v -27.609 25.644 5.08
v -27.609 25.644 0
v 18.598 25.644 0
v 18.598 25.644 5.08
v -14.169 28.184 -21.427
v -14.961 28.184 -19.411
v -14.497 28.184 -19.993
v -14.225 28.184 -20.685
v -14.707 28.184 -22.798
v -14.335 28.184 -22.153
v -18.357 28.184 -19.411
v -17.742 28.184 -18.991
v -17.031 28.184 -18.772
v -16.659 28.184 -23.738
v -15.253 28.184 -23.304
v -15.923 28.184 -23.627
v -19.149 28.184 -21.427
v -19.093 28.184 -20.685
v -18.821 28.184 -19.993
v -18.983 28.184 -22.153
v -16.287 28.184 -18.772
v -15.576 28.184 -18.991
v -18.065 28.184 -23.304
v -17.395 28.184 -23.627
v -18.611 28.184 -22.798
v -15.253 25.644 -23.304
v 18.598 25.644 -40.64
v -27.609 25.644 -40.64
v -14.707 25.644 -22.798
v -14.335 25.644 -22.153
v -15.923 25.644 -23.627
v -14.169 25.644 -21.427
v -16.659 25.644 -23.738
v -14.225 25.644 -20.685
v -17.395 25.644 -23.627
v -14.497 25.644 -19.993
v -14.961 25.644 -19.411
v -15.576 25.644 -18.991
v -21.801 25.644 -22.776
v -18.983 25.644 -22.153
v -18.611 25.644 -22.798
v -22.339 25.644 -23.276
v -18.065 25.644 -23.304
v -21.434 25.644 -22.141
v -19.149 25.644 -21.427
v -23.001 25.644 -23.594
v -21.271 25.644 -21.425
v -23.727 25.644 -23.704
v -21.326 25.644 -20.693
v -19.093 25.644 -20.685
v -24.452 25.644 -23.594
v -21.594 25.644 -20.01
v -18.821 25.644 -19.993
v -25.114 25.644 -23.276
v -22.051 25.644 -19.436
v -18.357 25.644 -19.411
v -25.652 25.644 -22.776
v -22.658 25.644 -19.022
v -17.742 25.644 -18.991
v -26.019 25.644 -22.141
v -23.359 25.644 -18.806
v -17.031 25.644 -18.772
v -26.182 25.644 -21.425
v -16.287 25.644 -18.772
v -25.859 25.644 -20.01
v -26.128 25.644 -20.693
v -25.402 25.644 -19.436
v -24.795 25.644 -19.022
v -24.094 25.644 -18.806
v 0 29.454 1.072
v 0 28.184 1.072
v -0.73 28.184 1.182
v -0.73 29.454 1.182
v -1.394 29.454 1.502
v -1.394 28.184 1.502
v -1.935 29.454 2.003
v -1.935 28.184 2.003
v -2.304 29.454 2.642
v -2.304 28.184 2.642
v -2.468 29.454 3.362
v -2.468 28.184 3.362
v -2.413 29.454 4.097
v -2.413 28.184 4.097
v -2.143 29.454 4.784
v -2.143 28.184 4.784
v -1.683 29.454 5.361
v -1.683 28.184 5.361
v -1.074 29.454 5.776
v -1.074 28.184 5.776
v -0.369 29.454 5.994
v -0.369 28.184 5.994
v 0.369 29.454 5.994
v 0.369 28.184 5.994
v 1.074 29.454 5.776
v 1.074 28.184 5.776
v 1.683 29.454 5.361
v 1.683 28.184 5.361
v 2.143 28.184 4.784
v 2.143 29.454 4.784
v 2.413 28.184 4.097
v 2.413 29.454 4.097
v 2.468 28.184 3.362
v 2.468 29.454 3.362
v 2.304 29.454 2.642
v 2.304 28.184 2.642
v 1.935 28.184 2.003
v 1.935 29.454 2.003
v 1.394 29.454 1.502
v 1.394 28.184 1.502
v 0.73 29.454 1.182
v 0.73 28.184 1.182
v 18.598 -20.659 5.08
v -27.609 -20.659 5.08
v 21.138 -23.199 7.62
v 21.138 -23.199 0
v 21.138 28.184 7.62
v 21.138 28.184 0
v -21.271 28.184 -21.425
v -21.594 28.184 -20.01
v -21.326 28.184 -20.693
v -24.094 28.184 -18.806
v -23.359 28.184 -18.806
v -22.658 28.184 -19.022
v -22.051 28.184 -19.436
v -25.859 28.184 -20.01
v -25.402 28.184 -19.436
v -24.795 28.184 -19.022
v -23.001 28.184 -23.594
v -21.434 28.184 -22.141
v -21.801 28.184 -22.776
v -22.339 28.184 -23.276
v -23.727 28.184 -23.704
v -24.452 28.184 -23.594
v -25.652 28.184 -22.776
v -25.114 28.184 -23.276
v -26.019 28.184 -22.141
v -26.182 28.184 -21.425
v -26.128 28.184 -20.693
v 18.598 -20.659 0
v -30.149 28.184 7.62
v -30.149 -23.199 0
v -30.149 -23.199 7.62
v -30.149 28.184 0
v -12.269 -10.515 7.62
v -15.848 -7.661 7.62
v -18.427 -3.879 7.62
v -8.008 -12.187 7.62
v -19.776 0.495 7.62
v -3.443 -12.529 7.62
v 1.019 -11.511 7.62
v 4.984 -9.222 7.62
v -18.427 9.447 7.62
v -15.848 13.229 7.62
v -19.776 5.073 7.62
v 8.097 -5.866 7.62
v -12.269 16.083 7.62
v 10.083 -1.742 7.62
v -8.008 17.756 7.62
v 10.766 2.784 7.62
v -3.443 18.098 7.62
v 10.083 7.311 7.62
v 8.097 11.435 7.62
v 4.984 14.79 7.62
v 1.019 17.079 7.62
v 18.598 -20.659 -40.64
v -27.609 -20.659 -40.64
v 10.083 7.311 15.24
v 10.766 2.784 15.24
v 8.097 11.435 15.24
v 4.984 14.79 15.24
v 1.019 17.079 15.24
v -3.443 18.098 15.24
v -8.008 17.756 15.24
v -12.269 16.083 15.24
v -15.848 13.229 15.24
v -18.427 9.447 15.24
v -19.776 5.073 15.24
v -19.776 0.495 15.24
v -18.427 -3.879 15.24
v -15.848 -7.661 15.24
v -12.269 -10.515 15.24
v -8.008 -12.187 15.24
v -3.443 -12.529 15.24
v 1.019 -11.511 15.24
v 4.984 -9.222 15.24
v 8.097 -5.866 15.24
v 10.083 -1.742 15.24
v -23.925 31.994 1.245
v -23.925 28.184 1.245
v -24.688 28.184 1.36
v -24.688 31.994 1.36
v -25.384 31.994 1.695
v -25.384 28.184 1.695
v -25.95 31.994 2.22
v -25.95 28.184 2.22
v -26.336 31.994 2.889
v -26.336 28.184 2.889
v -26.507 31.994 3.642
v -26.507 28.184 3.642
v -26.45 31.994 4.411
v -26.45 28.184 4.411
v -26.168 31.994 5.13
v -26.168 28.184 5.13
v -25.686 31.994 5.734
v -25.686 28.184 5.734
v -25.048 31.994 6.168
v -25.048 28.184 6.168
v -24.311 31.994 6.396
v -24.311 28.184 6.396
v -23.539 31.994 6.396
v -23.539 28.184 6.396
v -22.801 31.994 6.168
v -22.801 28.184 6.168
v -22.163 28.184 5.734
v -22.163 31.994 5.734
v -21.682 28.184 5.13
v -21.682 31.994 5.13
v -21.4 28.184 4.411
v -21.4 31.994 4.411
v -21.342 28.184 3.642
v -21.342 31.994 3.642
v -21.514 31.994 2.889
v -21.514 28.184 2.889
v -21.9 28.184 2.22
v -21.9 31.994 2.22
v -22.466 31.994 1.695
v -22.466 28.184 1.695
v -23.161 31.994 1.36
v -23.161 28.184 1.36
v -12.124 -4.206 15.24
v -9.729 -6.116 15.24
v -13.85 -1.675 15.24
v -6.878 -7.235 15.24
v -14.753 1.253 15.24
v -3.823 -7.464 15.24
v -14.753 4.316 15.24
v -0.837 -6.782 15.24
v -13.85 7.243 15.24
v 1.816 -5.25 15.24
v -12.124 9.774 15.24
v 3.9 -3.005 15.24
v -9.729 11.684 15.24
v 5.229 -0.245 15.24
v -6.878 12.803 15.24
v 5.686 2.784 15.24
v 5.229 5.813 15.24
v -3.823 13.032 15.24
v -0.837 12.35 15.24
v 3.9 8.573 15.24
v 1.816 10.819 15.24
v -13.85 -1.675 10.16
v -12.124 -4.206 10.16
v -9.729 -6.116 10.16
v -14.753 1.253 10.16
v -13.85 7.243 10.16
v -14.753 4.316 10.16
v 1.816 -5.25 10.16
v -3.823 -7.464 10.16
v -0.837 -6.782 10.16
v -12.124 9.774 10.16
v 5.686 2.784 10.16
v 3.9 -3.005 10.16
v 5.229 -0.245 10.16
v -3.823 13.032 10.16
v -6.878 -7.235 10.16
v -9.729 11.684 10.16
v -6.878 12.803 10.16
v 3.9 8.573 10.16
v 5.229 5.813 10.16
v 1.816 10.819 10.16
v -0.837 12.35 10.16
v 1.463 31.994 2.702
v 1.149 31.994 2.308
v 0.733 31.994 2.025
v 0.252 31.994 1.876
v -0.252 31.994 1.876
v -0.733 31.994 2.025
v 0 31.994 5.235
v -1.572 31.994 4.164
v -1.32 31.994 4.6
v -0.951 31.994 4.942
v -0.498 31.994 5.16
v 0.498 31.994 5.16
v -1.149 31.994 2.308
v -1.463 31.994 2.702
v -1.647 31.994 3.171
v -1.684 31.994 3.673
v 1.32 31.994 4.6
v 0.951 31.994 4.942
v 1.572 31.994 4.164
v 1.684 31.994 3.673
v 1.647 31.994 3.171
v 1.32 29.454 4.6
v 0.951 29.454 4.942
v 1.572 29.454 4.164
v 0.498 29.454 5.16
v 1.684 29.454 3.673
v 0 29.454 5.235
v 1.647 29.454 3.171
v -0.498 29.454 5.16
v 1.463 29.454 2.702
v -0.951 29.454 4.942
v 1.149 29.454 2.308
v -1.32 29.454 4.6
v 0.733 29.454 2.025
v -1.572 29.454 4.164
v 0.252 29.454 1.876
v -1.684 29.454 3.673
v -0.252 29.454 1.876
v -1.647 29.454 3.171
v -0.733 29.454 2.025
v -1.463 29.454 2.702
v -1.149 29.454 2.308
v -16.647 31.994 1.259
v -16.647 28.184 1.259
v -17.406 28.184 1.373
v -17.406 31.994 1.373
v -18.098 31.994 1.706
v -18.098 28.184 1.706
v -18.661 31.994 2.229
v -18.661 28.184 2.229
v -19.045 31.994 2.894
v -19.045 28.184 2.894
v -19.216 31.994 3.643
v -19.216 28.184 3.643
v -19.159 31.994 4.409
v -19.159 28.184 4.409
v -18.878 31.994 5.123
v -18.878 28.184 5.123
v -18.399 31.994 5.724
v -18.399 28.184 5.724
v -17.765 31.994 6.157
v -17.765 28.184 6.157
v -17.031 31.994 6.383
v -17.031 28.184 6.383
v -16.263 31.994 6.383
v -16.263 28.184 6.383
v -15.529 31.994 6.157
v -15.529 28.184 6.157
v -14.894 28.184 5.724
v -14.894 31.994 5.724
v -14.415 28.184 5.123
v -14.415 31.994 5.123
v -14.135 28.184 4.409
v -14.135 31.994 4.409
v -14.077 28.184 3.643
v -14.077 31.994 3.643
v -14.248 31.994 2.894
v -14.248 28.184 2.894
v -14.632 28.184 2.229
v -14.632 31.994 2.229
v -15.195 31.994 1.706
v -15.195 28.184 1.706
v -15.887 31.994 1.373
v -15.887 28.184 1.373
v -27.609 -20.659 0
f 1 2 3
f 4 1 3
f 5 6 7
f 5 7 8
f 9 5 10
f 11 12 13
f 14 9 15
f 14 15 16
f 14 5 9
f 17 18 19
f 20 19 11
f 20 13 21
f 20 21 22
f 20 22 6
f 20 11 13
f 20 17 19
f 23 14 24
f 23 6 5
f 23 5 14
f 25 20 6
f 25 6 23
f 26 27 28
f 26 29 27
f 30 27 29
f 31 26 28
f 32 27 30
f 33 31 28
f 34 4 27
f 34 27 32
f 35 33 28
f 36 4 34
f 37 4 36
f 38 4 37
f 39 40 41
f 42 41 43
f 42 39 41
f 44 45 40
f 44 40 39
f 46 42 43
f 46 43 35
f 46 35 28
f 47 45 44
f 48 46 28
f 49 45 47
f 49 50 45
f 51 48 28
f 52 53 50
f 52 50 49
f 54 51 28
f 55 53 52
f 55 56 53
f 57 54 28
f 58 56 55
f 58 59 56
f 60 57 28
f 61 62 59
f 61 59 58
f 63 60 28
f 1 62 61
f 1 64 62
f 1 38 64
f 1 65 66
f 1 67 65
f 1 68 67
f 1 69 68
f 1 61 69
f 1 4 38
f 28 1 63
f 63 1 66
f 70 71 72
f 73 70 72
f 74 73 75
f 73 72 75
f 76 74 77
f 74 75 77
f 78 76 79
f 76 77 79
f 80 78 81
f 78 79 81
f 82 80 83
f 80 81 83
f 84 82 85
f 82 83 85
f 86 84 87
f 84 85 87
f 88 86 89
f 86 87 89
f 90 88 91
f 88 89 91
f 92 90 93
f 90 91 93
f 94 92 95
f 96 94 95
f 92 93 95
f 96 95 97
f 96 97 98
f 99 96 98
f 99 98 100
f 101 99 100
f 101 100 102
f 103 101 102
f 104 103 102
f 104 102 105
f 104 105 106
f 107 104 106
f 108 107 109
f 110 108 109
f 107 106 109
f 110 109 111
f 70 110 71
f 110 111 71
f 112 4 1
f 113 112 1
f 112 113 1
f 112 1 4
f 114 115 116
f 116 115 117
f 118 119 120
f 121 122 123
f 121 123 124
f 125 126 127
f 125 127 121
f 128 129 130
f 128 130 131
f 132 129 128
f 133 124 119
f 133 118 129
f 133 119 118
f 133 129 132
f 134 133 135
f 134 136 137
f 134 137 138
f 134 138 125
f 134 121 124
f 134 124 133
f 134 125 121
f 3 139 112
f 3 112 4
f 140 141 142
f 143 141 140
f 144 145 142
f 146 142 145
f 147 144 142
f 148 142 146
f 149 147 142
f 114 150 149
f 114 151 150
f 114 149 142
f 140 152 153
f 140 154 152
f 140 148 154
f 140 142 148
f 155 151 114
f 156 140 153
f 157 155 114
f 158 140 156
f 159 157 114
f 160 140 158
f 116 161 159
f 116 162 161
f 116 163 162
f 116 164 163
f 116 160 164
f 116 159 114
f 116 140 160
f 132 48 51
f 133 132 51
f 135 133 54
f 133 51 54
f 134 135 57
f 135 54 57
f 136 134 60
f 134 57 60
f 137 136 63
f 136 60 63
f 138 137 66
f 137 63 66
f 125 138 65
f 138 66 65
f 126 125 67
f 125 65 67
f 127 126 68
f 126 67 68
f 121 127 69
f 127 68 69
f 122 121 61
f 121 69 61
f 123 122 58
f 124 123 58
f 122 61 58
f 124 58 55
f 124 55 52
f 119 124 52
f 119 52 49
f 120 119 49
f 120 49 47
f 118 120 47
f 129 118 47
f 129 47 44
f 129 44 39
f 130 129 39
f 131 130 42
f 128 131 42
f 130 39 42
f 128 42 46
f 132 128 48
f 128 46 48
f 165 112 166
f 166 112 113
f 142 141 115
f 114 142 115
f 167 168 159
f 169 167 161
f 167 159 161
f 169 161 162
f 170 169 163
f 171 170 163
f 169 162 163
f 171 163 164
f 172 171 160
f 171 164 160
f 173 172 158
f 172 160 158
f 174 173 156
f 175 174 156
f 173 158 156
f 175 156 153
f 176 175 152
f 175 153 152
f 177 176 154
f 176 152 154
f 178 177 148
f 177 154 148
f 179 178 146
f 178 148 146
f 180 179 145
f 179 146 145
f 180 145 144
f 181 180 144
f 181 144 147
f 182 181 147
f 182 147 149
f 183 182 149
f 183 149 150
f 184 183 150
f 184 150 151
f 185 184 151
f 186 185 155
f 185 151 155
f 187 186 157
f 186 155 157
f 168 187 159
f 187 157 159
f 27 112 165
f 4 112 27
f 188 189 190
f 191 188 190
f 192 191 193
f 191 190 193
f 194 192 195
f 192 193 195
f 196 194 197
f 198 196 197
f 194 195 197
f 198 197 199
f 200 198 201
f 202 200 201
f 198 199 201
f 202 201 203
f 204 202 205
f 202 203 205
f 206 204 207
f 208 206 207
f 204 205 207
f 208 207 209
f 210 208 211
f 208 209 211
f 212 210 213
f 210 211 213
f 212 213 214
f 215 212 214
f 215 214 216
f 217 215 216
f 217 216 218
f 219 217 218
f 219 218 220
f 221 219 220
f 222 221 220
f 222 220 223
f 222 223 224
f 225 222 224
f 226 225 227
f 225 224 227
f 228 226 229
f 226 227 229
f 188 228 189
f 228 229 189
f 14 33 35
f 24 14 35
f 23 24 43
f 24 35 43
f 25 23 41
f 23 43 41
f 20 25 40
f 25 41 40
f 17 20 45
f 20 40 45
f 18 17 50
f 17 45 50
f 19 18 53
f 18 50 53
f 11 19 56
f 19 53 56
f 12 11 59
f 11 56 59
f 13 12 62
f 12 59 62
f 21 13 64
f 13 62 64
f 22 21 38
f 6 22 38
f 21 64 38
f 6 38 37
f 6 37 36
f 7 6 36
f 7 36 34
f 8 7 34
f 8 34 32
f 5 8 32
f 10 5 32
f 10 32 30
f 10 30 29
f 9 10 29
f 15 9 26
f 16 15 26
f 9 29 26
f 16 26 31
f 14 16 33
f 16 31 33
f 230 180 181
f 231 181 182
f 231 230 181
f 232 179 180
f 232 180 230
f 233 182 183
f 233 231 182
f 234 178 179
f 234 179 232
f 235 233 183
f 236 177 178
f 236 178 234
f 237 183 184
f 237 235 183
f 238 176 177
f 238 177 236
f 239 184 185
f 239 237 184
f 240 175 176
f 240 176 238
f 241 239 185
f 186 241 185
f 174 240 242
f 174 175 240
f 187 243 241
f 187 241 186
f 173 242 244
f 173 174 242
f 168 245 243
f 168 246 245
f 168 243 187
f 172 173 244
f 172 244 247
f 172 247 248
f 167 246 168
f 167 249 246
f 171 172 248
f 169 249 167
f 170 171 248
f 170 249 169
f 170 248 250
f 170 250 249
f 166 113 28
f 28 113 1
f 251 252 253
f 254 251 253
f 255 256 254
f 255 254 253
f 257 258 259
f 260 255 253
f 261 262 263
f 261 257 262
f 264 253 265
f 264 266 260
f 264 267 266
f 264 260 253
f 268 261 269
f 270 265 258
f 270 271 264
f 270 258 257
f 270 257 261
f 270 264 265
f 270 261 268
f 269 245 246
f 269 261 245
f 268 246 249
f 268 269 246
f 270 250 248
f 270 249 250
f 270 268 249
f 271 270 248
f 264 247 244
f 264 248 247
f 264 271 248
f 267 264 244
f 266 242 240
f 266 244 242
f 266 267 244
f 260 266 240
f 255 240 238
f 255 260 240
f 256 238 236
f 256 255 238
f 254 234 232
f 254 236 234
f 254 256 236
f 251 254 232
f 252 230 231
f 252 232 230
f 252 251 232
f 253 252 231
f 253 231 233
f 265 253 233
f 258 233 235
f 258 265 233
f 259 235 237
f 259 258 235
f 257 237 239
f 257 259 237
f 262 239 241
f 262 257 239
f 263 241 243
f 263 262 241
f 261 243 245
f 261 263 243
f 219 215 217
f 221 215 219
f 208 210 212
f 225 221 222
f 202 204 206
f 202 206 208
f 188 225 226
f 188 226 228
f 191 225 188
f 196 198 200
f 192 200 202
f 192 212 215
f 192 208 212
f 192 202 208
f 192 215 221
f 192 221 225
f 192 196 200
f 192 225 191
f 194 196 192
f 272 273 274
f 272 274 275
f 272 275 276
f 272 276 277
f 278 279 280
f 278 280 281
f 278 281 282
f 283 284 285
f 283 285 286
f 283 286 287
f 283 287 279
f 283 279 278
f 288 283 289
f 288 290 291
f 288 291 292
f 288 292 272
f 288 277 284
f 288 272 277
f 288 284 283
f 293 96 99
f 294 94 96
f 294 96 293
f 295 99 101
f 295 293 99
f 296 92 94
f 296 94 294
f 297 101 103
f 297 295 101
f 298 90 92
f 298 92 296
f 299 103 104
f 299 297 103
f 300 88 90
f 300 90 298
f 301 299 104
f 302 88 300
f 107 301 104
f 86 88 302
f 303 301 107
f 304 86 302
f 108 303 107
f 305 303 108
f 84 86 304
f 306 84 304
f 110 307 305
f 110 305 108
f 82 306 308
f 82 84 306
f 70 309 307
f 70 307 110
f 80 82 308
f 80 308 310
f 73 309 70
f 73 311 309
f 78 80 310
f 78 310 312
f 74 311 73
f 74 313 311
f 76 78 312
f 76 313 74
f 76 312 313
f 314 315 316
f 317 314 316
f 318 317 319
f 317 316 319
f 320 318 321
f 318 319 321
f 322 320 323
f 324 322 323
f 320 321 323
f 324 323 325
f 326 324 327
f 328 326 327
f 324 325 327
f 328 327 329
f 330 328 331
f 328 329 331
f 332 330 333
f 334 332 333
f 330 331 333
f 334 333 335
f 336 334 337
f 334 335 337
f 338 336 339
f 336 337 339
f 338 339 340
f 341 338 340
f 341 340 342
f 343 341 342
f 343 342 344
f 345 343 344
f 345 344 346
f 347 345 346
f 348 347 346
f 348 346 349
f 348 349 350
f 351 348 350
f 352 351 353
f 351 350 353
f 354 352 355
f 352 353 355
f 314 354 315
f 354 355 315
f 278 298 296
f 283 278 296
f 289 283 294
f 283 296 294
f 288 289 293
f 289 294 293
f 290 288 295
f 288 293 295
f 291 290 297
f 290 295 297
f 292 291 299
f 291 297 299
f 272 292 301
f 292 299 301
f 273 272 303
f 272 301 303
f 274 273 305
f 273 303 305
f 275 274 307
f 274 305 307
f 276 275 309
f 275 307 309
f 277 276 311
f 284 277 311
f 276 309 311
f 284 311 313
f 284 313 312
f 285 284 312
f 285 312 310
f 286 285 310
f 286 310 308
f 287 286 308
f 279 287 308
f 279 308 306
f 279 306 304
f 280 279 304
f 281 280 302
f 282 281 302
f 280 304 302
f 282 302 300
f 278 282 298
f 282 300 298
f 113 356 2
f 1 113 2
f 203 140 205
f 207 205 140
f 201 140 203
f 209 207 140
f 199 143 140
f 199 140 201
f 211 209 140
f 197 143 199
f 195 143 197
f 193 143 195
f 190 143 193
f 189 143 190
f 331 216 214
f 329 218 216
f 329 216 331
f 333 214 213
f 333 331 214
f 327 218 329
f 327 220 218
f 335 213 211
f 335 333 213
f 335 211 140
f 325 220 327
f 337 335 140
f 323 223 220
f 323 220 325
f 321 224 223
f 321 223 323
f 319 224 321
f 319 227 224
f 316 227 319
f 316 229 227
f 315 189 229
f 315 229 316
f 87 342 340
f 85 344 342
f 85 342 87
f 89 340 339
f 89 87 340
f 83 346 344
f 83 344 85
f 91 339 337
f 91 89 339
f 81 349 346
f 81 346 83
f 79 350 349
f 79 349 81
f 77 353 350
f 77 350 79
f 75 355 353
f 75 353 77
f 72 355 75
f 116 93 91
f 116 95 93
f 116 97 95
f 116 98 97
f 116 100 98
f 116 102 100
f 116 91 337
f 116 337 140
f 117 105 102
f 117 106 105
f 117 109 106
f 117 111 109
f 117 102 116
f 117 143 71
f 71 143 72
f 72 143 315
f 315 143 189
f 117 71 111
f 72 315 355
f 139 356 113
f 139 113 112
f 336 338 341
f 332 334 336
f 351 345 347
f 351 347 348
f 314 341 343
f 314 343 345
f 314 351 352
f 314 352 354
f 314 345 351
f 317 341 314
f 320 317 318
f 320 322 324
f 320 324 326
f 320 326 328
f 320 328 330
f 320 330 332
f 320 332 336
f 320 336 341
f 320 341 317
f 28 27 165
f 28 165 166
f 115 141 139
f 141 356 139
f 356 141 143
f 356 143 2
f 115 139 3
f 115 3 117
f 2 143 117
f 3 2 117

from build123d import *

# Parameters (mm, degrees)
SKETCH1_W           = 51.287597598
SKETCH1_H           = 51.383462266
BOSS_EXTRUDE1_DEPTH = 7.62
SHELL2_T            = -2.54
SKETCH3_W           = 46.207597598
SKETCH3_H           = 46.303462266
BOSS_EXTRUDE2_DEPTH = 45.72
SKETCH8_R           = 15.356608436
BOSS_EXTRUDE4_DEPTH = 7.62
SHELL9_T            = -5.08
SKETCH11_R          = 2.58975373
SKETCH11_R_2        = 2.576633152
BOSS_EXTRUDE5_DEPTH = 3.81
SKETCH12_R          = 2.474939987
BOSS_EXTRUDE6_DEPTH = 1.27
SKETCH13_R          = 1.688973415
BOSS_EXTRUDE7_DEPTH = 2.54
SKETCH16_R          = 2.496690969
SKETCH16_R_2        = 2.462776399
BOSS_EXTRUDE9_DEPTH = 2.54


with BuildPart() as part:
    # Sketch1 → Boss-Extrude1 (new body)
    with BuildSketch(Plane.XY):
        with Locations((-4.505639415, 2.492481379)):
            Rectangle(SKETCH1_W, SKETCH1_H)
    extrude(amount=BOSS_EXTRUDE1_DEPTH)

    # Shell2
    shell2_openings = [part.faces().sort_by_distance(p)[0] for p in [
        (-4.505639415, 2.492481379, 0),
    ]]
    offset(amount=SHELL2_T, openings=shell2_openings, kind=Kind.INTERSECTION)

    # Sketch8 → Boss-Extrude4 (add)
    with BuildSketch(Plane.XY.offset(7.62)):
        with Locations((-4.590970541, 2.784212512)):
            Circle(SKETCH8_R)
    extrude(amount=BOSS_EXTRUDE4_DEPTH)

    # Shell9
    shell9_openings = [part.faces().sort_by_distance(p)[0] for p in [
        (-4.590970541, 2.784212512, 15.24),
    ]]
    offset(amount=SHELL9_T, openings=shell9_openings, kind=Kind.INTERSECTION)

    # Sketch11 → Boss-Extrude5 (add)
    with BuildSketch(Plane(origin=(0, 28.184212512, 0), x_dir=(1, 0, 0), z_dir=(0, 1, 0))):
        with Locations(Location((-23.92482166, -3.835162685, 0), (0, 0, 90))):
            Circle(SKETCH11_R)
        with Locations(Location((-16.646720661, -3.835162685, 0), (0, 0, 90))):
            Circle(SKETCH11_R_2)
    extrude(amount=BOSS_EXTRUDE5_DEPTH)

    # Sketch12 → Boss-Extrude6 (add)
    with BuildSketch(Plane(origin=(0, 28.184212512, 0), x_dir=(1, 0, 0), z_dir=(0, 1, 0))):
        with Locations(Location((0, -3.546492159, 0), (0, 0, 90))):
            Circle(SKETCH12_R)
    extrude(amount=BOSS_EXTRUDE6_DEPTH)

    # Sketch13 → Boss-Extrude7 (add)
    with BuildSketch(Plane(origin=(0, 29.454212512, 0), x_dir=(1, 0, 0), z_dir=(0, 1, 0))):
        with Locations(Location((0, -3.546492159, 0), (0, 0, 270))):
            Circle(SKETCH13_R)
    extrude(amount=BOSS_EXTRUDE7_DEPTH)


with BuildPart() as body_2:
    # Sketch3 → Boss-Extrude2 (new body)
    with BuildSketch(Plane(origin=(0, 0, 5.08), x_dir=(-1, 0, 0), z_dir=(0, 0, -1))):
        with Locations((4.505639415, 2.492481379)):
            Rectangle(SKETCH3_W, SKETCH3_H)
    extrude(amount=BOSS_EXTRUDE2_DEPTH)

    # Sketch16 → Boss-Extrude9 (add)
    with BuildSketch(Plane(origin=(0, 25.644212512, 0), x_dir=(1, 0, 0), z_dir=(0, 1, 0))):
        with Locations(Location((-16.658967026, 21.240915572, 0), (0, 0, 90))):
            Circle(SKETCH16_R)
        with Locations(Location((-23.72655588, 21.240915572, 0), (0, 0, 90))):
            Circle(SKETCH16_R_2)
    extrude(amount=BOSS_EXTRUDE9_DEPTH)


solid = Compound([part.part, body_2.part])
